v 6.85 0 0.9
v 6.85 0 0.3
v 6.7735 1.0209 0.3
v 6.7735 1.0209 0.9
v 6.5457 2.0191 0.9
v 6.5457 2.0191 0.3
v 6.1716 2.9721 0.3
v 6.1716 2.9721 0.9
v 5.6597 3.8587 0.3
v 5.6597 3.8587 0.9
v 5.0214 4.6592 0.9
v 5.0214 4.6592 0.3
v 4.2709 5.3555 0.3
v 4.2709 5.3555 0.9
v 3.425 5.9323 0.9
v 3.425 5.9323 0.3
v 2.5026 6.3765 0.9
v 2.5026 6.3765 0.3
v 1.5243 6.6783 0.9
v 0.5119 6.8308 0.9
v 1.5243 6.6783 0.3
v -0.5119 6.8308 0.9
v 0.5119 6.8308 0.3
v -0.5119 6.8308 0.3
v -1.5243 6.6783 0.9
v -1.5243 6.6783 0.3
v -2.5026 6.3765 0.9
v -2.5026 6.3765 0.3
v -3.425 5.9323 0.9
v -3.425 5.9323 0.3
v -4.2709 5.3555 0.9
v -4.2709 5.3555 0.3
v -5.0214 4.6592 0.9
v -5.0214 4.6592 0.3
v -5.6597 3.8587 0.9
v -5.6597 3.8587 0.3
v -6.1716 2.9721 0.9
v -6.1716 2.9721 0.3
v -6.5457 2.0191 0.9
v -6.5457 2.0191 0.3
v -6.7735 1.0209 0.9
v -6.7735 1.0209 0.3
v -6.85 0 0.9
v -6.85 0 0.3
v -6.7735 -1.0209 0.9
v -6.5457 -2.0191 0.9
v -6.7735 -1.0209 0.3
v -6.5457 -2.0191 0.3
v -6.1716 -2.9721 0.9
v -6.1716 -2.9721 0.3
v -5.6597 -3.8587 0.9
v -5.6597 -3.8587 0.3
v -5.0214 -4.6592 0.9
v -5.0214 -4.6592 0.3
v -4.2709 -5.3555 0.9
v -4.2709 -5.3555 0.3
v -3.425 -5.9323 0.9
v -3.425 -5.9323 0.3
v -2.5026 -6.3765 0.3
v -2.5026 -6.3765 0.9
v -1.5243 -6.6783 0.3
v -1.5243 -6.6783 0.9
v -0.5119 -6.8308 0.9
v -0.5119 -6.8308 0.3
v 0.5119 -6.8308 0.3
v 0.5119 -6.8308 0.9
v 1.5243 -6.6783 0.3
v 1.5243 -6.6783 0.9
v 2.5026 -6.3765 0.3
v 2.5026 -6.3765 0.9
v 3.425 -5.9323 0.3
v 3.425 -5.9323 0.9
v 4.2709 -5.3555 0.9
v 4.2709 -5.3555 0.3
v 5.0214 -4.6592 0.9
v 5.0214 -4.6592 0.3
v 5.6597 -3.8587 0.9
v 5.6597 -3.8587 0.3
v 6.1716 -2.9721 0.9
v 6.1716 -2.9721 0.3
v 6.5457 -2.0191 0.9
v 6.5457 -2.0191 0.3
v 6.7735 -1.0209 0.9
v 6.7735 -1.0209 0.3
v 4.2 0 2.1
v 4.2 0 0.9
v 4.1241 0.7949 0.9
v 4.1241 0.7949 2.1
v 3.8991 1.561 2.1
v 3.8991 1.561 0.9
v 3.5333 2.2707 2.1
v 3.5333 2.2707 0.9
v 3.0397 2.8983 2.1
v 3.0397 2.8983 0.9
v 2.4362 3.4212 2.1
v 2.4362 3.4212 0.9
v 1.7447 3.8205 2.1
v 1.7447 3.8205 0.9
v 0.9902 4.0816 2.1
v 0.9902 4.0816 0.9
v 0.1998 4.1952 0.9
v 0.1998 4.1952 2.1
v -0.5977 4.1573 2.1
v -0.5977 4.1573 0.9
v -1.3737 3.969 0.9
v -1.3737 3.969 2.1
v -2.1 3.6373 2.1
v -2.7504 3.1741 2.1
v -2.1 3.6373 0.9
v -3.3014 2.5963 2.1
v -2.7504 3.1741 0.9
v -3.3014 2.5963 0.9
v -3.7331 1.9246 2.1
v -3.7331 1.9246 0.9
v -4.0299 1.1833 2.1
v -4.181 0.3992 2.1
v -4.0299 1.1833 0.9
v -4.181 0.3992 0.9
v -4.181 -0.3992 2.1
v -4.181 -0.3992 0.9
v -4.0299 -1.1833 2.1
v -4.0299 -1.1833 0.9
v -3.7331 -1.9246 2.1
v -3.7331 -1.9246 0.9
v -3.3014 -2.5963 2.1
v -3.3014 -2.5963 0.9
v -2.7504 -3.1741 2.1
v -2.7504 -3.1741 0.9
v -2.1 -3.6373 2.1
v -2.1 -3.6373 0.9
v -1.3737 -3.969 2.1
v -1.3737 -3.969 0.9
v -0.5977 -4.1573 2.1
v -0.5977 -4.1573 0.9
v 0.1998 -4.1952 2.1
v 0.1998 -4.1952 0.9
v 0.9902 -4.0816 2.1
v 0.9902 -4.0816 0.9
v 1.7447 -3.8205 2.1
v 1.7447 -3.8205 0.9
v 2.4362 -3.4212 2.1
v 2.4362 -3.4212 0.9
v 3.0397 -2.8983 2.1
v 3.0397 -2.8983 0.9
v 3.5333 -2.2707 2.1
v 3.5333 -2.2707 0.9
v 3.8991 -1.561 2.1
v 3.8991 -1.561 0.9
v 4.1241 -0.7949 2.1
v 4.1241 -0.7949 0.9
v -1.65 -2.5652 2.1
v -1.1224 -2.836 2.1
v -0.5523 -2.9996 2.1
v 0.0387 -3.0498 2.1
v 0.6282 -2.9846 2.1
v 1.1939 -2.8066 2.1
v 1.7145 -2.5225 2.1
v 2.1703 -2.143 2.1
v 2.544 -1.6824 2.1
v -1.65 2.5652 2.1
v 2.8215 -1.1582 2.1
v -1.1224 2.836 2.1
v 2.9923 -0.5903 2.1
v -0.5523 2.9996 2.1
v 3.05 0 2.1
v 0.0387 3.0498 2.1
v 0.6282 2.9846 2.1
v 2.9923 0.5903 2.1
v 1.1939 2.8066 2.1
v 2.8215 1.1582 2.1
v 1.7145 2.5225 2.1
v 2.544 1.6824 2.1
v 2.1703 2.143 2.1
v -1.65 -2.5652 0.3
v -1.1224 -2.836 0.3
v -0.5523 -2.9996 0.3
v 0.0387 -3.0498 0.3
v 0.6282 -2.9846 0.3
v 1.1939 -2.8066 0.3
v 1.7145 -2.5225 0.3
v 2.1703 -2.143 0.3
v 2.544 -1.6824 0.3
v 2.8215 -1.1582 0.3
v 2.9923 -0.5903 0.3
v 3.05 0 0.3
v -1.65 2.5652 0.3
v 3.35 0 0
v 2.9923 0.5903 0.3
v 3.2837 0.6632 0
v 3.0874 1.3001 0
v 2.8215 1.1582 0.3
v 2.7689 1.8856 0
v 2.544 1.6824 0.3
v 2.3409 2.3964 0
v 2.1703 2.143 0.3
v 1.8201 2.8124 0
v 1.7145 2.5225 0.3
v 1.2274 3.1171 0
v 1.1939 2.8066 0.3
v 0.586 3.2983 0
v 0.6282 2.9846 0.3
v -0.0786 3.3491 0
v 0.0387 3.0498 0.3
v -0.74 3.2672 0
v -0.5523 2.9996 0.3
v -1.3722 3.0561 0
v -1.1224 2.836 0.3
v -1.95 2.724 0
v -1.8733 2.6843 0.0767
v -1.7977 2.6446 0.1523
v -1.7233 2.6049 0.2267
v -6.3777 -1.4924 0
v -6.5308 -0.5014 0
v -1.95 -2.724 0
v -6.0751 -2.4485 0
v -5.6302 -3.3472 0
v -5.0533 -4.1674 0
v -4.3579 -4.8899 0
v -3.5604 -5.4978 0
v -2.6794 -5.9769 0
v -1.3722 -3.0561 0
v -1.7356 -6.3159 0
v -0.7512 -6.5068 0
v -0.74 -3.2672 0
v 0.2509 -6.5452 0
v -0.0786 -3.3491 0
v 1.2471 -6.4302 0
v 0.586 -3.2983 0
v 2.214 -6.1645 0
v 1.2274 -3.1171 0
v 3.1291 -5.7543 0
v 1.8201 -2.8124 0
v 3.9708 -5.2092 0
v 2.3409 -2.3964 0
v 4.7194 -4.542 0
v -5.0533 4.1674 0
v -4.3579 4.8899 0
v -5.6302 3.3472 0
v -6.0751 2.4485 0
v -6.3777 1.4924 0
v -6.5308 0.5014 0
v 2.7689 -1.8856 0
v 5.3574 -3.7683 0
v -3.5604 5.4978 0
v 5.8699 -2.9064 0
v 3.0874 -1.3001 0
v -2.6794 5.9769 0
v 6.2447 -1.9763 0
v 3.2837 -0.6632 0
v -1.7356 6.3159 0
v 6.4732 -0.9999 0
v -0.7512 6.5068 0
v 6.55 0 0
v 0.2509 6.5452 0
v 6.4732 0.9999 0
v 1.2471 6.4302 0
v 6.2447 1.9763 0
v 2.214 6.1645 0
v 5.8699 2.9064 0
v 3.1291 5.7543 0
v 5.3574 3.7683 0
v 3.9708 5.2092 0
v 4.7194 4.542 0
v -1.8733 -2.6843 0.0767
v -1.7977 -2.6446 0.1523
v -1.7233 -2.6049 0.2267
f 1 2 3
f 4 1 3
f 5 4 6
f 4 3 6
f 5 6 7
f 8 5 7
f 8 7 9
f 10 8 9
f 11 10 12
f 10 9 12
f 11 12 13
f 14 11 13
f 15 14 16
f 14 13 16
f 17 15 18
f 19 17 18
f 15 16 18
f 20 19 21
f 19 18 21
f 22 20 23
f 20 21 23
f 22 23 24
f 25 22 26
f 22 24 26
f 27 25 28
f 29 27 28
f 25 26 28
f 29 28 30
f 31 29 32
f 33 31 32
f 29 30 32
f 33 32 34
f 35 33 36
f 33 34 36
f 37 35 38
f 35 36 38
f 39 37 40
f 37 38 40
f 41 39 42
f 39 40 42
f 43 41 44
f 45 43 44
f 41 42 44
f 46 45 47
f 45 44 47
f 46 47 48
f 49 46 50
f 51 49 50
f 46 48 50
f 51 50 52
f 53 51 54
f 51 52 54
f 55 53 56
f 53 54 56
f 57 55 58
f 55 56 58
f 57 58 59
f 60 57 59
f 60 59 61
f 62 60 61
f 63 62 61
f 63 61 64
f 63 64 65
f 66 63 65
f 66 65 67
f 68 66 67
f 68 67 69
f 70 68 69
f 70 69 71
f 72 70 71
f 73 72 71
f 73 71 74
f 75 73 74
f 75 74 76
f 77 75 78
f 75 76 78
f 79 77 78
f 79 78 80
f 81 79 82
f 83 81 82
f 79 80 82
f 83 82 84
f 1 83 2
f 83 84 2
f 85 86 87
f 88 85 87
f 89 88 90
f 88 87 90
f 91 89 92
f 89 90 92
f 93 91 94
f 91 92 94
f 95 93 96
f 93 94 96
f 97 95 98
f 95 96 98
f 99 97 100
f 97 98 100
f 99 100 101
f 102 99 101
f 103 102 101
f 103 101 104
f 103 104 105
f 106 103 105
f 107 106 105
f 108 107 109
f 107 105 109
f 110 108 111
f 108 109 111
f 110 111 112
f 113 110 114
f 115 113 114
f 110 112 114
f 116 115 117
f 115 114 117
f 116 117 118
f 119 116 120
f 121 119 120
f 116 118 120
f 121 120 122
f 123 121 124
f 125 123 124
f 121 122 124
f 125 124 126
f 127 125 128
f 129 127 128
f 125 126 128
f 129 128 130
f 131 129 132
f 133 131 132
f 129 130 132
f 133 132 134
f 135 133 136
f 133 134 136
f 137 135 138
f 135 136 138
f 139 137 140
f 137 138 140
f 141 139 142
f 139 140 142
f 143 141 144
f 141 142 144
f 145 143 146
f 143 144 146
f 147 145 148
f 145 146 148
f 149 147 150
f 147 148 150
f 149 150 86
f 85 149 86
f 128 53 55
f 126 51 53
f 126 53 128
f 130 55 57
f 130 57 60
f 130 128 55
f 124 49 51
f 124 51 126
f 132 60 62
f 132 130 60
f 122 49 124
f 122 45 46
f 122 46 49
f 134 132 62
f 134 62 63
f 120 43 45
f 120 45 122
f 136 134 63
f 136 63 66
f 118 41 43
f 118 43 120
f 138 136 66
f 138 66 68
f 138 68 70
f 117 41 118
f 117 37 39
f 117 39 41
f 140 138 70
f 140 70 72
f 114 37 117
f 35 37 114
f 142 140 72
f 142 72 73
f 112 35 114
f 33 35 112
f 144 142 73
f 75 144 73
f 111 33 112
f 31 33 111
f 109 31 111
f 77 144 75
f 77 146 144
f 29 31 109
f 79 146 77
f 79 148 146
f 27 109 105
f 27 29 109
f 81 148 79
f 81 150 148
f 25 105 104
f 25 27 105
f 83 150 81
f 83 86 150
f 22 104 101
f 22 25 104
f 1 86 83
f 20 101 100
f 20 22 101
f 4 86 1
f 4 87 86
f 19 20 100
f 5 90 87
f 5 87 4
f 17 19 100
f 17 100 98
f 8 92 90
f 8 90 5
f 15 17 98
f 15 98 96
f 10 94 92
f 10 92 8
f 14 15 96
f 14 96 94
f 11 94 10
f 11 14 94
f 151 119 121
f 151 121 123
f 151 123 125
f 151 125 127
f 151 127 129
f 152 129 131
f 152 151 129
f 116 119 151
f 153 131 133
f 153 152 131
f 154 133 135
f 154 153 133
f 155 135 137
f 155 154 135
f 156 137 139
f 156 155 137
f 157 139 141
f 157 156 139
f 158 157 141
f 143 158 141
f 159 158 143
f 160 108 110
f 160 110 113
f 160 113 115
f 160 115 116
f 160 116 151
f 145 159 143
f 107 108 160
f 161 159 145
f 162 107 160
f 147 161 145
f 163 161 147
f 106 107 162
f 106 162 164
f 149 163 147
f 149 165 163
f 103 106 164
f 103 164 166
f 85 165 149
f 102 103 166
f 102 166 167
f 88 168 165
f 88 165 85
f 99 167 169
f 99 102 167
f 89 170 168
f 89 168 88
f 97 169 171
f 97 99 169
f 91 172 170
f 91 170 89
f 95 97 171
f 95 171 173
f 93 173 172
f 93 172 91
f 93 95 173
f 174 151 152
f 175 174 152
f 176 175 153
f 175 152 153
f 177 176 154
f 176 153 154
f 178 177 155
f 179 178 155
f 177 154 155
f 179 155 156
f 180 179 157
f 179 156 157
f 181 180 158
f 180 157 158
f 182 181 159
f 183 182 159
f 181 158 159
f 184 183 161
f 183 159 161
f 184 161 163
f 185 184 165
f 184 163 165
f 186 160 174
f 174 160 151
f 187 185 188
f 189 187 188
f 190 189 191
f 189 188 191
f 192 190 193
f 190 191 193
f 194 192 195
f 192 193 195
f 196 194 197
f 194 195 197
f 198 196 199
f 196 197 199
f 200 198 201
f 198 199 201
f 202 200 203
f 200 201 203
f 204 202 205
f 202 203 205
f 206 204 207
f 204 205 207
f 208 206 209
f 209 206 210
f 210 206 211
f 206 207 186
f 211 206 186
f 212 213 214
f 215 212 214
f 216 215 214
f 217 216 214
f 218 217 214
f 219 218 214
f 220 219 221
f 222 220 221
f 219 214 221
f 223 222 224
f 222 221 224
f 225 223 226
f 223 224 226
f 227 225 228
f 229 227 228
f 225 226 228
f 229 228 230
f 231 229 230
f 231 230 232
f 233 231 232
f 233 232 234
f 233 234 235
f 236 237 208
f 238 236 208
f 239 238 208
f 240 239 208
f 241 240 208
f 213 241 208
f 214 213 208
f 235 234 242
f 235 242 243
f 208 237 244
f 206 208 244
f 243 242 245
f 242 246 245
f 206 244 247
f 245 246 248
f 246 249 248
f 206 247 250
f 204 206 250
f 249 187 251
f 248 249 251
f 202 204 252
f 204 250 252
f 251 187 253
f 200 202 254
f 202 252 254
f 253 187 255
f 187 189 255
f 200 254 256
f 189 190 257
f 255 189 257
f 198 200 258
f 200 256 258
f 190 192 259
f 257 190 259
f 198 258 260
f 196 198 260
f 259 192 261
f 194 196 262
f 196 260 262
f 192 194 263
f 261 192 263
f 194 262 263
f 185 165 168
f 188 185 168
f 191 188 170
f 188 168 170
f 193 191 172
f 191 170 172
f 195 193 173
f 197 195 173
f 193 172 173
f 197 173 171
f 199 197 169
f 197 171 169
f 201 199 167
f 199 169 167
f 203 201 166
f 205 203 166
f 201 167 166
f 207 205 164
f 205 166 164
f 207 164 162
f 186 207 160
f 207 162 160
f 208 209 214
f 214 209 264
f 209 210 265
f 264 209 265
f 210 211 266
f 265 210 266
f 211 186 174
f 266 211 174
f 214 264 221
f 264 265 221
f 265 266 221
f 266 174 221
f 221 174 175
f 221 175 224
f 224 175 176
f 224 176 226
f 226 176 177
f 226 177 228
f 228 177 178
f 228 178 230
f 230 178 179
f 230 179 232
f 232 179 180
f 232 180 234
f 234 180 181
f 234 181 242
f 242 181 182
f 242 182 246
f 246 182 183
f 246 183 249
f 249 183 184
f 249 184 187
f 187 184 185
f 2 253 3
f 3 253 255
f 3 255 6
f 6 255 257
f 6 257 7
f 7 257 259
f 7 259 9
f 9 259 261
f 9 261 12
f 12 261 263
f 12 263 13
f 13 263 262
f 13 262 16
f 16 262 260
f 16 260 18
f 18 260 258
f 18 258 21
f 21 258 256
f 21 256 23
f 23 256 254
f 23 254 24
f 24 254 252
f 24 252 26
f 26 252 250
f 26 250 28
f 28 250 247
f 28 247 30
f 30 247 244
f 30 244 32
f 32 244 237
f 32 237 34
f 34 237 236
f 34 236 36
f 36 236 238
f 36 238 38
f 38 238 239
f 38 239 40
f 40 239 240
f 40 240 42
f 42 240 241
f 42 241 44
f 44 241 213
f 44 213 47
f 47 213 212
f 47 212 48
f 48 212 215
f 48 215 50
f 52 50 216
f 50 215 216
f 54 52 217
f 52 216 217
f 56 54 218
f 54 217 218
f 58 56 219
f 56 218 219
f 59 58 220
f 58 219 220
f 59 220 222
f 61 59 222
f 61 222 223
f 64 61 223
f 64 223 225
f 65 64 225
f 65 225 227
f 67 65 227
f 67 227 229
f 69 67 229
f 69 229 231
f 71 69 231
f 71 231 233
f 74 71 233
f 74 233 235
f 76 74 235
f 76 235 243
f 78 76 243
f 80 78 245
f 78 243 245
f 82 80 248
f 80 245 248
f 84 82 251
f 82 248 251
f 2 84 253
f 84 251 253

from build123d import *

# Parameters (mm, degrees)
F0_R     = 6.85
F1_DEPTH = 0.9
F2_R     = 4.2
F3_DEPTH = 1.2
F5_DEPTH = 2.1
F6_SIZE  = 0.3


with BuildPart() as f1:
    # F0 (on Top) → F1 (new body)
    with BuildSketch(Plane.XY):
        Circle(F0_R)
    extrude(amount=F1_DEPTH)

    # F2 (on face) → F3 (join)
    with BuildSketch(Plane.XY.offset(0.9)):
        Circle(F2_R)
    extrude(amount=F3_DEPTH)

    # F4 (on face) → F5 (cut, through all)
    with BuildSketch(Plane.XY.offset(2.1)):
        with BuildLine():
            ThreePointArc((-1.65, -2.5651510677), (1.4611639196, -2.677218706), (3.05, 0))
            ThreePointArc((3.05, 0), (1.4611639196, 2.677218706), (-1.65, 2.5651510677))
            Line((-1.65, 2.5651510677), (-1.65, -2.5651510677))
        make_face()
    extrude(amount=-F5_DEPTH, mode=Mode.SUBTRACT)

    # F6
    f6_edges = [f1.edges().sort_by_distance(p)[0] for p in [
        (-6.85, 0, 0),
        (3.05, 0, 0),
        (-1.65, 0, 0),
    ]]
    chamfer(f6_edges, length=F6_SIZE)


solid = f1.part
